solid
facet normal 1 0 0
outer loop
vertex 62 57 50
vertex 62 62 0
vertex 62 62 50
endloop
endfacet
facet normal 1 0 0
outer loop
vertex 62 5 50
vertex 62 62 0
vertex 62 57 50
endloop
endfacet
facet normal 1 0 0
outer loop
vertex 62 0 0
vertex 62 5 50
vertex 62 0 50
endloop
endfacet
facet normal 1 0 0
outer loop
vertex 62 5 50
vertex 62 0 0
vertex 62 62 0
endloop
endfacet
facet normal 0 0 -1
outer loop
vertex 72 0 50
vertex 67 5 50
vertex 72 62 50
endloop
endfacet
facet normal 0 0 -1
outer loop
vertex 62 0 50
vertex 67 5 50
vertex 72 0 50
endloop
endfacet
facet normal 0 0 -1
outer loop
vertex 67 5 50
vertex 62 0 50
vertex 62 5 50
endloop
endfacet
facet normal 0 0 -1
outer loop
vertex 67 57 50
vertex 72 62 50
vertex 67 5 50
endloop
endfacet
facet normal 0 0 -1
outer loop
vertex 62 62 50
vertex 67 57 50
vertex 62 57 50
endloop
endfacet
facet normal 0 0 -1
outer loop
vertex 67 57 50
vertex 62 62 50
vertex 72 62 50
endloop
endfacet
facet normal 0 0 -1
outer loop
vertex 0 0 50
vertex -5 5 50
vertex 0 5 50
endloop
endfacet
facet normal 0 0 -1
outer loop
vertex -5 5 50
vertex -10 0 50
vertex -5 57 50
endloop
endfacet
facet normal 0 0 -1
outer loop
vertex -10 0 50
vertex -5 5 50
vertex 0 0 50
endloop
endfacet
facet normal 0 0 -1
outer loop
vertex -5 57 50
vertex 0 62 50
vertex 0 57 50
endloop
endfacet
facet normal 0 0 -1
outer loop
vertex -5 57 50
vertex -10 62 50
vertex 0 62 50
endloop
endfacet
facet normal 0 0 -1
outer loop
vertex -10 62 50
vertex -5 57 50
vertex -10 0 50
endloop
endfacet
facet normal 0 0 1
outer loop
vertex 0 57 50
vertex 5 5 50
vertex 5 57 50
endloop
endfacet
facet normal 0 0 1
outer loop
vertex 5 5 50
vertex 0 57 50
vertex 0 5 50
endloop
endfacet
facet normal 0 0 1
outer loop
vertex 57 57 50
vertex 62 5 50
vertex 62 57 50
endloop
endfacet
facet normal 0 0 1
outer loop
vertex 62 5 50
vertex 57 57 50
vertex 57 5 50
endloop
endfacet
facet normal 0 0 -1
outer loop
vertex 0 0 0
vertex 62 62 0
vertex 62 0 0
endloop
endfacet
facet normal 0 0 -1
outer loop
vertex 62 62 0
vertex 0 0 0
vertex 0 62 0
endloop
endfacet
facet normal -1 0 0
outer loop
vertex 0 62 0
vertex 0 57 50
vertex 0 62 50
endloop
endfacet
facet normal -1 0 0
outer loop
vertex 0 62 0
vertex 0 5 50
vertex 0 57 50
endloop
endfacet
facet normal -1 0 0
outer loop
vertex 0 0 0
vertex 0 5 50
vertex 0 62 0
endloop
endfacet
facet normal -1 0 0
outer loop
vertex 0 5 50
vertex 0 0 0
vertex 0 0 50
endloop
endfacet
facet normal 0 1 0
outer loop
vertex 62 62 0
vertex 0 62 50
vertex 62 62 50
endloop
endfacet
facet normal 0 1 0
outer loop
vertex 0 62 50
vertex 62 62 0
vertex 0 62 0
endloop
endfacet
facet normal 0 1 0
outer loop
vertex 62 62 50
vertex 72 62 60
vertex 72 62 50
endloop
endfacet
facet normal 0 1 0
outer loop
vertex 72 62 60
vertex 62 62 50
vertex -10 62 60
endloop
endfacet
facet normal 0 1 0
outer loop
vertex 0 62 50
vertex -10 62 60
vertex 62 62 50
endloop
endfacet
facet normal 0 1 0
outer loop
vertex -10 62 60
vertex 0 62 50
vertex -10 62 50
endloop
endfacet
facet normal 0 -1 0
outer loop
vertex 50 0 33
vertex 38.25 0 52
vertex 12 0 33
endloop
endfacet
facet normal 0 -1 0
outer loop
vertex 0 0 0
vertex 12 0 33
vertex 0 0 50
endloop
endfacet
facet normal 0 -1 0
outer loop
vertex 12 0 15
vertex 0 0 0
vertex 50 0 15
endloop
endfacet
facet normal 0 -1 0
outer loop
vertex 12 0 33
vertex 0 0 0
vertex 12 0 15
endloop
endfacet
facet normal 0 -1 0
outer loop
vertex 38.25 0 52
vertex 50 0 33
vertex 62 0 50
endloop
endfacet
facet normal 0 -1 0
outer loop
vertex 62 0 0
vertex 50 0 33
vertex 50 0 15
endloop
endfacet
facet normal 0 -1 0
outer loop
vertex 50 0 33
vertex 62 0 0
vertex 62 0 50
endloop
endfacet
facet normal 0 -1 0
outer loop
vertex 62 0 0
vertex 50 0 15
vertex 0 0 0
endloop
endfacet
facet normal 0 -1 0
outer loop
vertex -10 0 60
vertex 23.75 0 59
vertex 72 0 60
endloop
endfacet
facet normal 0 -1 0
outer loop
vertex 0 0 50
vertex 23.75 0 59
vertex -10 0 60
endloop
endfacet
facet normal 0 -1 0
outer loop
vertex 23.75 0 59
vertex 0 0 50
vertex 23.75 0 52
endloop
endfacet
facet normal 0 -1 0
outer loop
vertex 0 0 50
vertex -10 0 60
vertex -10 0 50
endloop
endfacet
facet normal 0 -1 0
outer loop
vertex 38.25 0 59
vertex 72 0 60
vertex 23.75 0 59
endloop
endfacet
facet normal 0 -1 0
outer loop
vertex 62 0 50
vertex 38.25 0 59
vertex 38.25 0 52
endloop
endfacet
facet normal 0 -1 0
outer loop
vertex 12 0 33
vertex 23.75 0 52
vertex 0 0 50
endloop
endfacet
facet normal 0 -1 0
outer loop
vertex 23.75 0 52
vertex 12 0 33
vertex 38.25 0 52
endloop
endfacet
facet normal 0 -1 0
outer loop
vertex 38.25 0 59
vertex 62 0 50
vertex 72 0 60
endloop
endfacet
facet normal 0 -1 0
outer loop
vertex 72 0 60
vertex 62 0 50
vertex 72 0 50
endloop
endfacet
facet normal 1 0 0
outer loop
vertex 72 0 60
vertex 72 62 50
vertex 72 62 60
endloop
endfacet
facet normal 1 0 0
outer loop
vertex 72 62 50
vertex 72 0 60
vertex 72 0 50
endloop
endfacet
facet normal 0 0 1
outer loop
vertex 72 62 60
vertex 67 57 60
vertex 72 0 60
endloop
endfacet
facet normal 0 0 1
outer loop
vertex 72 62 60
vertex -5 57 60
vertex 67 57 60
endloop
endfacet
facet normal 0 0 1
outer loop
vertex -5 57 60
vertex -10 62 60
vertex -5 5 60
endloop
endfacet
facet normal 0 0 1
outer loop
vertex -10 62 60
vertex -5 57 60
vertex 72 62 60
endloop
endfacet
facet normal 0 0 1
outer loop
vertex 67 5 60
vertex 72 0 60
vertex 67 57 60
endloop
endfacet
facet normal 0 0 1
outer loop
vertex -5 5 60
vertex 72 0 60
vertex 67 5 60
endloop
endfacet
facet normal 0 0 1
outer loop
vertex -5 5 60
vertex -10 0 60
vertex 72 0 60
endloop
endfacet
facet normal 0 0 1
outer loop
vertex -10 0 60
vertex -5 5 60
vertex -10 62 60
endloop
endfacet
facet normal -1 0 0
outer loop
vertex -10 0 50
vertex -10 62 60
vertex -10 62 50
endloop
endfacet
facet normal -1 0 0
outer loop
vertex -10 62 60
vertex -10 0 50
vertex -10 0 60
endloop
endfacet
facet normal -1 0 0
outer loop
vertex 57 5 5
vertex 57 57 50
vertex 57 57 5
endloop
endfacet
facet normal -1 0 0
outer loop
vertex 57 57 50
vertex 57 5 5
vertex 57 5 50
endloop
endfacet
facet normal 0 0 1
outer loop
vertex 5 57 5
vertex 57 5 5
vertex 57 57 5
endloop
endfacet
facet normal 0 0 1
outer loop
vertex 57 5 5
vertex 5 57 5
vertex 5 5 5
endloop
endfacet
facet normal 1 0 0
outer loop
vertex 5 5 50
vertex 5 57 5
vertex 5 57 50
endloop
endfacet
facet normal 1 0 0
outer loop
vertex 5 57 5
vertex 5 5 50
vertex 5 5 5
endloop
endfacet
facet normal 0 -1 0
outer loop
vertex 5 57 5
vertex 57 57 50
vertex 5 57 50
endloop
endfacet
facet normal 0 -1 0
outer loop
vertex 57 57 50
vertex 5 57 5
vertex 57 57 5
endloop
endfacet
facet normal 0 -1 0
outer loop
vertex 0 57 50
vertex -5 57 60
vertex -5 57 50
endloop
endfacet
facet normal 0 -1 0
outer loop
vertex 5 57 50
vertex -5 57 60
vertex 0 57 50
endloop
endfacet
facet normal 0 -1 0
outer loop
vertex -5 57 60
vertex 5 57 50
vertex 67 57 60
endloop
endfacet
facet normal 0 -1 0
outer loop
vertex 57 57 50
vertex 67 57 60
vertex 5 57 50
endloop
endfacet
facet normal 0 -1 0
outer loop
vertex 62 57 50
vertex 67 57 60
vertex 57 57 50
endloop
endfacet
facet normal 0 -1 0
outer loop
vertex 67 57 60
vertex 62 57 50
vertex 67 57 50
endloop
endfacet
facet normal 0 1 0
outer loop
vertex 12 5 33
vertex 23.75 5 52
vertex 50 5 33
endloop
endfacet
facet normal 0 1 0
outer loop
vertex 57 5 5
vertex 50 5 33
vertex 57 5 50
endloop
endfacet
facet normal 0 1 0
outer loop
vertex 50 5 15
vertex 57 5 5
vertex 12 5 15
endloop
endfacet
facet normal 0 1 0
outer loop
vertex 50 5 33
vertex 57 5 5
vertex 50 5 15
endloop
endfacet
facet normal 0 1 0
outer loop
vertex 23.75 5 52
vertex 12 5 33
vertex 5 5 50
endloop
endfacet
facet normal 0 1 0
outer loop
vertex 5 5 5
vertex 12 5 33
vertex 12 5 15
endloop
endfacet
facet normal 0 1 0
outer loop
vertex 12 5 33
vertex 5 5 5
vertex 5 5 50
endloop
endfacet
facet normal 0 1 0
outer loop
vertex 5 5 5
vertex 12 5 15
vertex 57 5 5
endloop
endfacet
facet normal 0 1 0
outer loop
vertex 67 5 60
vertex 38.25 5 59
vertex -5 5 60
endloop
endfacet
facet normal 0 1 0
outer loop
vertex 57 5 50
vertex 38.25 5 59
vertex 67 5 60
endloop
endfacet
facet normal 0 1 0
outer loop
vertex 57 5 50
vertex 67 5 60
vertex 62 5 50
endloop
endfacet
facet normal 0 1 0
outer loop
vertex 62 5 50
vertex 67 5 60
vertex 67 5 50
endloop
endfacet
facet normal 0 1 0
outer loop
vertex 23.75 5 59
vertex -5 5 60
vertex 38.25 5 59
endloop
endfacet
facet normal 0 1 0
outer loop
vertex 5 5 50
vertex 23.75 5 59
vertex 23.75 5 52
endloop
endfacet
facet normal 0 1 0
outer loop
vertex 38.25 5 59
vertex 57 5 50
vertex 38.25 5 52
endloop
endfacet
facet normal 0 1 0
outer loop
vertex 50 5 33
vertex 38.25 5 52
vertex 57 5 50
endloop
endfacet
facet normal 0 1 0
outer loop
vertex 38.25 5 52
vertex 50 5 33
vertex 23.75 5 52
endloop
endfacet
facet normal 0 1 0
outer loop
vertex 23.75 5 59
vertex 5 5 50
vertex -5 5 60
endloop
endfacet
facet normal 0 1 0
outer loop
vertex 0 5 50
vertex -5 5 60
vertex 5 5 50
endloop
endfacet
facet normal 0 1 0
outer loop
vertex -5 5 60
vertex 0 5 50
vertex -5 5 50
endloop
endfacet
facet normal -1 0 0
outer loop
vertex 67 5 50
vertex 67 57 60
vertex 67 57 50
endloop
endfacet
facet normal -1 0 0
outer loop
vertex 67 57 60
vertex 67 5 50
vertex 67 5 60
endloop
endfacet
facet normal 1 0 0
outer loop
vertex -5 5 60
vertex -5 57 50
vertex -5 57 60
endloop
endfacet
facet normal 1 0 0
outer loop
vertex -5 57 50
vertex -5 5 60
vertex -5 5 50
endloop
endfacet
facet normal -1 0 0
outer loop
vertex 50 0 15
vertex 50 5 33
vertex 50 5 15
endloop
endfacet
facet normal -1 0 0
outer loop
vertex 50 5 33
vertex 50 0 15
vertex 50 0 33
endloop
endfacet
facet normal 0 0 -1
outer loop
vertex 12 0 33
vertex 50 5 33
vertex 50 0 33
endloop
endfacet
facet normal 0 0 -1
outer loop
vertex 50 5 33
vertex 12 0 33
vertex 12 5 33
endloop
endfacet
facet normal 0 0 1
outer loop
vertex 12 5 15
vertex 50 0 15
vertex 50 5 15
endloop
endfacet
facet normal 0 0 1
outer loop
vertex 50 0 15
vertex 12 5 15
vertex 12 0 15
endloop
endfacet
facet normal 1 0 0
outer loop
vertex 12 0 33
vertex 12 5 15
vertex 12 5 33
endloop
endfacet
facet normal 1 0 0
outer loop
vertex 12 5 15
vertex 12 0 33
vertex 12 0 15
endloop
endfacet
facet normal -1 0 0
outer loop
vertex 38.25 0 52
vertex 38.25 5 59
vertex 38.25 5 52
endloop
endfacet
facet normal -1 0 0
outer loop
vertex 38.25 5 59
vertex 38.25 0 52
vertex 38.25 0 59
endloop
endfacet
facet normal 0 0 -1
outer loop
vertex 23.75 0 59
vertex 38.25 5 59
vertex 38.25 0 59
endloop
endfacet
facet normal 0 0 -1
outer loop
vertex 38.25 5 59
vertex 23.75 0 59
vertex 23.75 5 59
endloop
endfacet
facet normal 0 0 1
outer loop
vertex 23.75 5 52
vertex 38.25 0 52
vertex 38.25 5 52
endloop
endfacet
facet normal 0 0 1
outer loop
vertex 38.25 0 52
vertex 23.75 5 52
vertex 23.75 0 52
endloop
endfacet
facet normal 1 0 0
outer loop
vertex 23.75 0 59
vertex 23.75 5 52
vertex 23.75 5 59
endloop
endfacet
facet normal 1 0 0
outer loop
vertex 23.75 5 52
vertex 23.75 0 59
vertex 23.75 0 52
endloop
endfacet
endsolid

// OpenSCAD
// ==========================================
// TRANSFORMER + PERFBOARD BOX
// All dimensions in mm
// ==========================================

$fn = 64;

// ==========================================
// MAIN DIMENSIONS
// ==========================================

wall = 5;

// Lower section
lower_inner_w = 52;
lower_inner_d = 52;
lower_h = 50;

lower_outer_w = lower_inner_w + 2*wall; // 62
lower_outer_d = lower_inner_d + 2*wall; // 62

// Upper section
upper_inner_w = 72;
upper_inner_d = 52;

upper_outer_w = upper_inner_w + 2*wall; // 82
upper_outer_d = upper_inner_d + 2*wall; // 62

upper_h = 10;


// ==========================================
// SLIDING RAILS
// ==========================================

rail_width = 4;
rail_height = 2;
rail_z = 56;


// ==========================================
// MAIN BODY
// ==========================================

difference() {

    // ======================================
    // OUTER BODY
    // ======================================

    union() {

        // Lower section
        cube([
            lower_outer_w,
            lower_outer_d,
            lower_h
        ]);

        // Upper expanded section
        translate([
            (lower_outer_w - upper_outer_w)/2,
            0,
            lower_h
        ])
        cube([
            upper_outer_w,
            upper_outer_d,
            upper_h
        ]);

        // ----------------------------------
        // LEFT SLIDING RAIL
        // ----------------------------------

        translate([
            (lower_outer_w - upper_outer_w)/2 + wall,
            0,
            rail_z
        ])
        cube([
            rail_width,
            upper_outer_d,
            rail_height
        ]);

        // ----------------------------------
        // RIGHT SLIDING RAIL
        // ----------------------------------

        translate([
            (lower_outer_w - upper_outer_w)/2
            + upper_outer_w
            - wall
            - rail_width,
            0,
            rail_z
        ])
        cube([
            rail_width,
            upper_outer_d,
            rail_height
        ]);
    }


    // ======================================
    // LOWER TRANSFORMER CAVITY
    // ======================================

    translate([
        wall,
        wall,
        wall
    ])
    cube([
        lower_inner_w,
        lower_inner_d,
        lower_h + 1
    ]);


    // ======================================
    // UPPER OPENING
    // ======================================

    translate([
        (lower_outer_w - upper_inner_w)/2,
        wall,
        lower_h
    ])
    cube([
        upper_inner_w,
        upper_inner_d,
        upper_h + 1
    ]);


    // ======================================
    // LOWER HOLE
    // 38 x 18 mm
    // ======================================

    lower_hole_w = 38;
    lower_hole_h = 18;

    translate([
        (lower_outer_w - lower_hole_w)/2,
        -1,
        15
    ])
    cube([
        lower_hole_w,
        wall + 2,
        lower_hole_h
    ]);


    // ======================================
    // UPPER HOLE
    // 14.5 x 7 mm
    // ======================================

    upper_hole_w = 14.5;
    upper_hole_h = 7;

    translate([
        (upper_outer_w - upper_hole_w)/2
        + (lower_outer_w - upper_outer_w)/2,
        -1,
        lower_h + 2
    ])
    cube([
        upper_hole_w,
        wall + 2,
        upper_hole_h
    ]);
}
